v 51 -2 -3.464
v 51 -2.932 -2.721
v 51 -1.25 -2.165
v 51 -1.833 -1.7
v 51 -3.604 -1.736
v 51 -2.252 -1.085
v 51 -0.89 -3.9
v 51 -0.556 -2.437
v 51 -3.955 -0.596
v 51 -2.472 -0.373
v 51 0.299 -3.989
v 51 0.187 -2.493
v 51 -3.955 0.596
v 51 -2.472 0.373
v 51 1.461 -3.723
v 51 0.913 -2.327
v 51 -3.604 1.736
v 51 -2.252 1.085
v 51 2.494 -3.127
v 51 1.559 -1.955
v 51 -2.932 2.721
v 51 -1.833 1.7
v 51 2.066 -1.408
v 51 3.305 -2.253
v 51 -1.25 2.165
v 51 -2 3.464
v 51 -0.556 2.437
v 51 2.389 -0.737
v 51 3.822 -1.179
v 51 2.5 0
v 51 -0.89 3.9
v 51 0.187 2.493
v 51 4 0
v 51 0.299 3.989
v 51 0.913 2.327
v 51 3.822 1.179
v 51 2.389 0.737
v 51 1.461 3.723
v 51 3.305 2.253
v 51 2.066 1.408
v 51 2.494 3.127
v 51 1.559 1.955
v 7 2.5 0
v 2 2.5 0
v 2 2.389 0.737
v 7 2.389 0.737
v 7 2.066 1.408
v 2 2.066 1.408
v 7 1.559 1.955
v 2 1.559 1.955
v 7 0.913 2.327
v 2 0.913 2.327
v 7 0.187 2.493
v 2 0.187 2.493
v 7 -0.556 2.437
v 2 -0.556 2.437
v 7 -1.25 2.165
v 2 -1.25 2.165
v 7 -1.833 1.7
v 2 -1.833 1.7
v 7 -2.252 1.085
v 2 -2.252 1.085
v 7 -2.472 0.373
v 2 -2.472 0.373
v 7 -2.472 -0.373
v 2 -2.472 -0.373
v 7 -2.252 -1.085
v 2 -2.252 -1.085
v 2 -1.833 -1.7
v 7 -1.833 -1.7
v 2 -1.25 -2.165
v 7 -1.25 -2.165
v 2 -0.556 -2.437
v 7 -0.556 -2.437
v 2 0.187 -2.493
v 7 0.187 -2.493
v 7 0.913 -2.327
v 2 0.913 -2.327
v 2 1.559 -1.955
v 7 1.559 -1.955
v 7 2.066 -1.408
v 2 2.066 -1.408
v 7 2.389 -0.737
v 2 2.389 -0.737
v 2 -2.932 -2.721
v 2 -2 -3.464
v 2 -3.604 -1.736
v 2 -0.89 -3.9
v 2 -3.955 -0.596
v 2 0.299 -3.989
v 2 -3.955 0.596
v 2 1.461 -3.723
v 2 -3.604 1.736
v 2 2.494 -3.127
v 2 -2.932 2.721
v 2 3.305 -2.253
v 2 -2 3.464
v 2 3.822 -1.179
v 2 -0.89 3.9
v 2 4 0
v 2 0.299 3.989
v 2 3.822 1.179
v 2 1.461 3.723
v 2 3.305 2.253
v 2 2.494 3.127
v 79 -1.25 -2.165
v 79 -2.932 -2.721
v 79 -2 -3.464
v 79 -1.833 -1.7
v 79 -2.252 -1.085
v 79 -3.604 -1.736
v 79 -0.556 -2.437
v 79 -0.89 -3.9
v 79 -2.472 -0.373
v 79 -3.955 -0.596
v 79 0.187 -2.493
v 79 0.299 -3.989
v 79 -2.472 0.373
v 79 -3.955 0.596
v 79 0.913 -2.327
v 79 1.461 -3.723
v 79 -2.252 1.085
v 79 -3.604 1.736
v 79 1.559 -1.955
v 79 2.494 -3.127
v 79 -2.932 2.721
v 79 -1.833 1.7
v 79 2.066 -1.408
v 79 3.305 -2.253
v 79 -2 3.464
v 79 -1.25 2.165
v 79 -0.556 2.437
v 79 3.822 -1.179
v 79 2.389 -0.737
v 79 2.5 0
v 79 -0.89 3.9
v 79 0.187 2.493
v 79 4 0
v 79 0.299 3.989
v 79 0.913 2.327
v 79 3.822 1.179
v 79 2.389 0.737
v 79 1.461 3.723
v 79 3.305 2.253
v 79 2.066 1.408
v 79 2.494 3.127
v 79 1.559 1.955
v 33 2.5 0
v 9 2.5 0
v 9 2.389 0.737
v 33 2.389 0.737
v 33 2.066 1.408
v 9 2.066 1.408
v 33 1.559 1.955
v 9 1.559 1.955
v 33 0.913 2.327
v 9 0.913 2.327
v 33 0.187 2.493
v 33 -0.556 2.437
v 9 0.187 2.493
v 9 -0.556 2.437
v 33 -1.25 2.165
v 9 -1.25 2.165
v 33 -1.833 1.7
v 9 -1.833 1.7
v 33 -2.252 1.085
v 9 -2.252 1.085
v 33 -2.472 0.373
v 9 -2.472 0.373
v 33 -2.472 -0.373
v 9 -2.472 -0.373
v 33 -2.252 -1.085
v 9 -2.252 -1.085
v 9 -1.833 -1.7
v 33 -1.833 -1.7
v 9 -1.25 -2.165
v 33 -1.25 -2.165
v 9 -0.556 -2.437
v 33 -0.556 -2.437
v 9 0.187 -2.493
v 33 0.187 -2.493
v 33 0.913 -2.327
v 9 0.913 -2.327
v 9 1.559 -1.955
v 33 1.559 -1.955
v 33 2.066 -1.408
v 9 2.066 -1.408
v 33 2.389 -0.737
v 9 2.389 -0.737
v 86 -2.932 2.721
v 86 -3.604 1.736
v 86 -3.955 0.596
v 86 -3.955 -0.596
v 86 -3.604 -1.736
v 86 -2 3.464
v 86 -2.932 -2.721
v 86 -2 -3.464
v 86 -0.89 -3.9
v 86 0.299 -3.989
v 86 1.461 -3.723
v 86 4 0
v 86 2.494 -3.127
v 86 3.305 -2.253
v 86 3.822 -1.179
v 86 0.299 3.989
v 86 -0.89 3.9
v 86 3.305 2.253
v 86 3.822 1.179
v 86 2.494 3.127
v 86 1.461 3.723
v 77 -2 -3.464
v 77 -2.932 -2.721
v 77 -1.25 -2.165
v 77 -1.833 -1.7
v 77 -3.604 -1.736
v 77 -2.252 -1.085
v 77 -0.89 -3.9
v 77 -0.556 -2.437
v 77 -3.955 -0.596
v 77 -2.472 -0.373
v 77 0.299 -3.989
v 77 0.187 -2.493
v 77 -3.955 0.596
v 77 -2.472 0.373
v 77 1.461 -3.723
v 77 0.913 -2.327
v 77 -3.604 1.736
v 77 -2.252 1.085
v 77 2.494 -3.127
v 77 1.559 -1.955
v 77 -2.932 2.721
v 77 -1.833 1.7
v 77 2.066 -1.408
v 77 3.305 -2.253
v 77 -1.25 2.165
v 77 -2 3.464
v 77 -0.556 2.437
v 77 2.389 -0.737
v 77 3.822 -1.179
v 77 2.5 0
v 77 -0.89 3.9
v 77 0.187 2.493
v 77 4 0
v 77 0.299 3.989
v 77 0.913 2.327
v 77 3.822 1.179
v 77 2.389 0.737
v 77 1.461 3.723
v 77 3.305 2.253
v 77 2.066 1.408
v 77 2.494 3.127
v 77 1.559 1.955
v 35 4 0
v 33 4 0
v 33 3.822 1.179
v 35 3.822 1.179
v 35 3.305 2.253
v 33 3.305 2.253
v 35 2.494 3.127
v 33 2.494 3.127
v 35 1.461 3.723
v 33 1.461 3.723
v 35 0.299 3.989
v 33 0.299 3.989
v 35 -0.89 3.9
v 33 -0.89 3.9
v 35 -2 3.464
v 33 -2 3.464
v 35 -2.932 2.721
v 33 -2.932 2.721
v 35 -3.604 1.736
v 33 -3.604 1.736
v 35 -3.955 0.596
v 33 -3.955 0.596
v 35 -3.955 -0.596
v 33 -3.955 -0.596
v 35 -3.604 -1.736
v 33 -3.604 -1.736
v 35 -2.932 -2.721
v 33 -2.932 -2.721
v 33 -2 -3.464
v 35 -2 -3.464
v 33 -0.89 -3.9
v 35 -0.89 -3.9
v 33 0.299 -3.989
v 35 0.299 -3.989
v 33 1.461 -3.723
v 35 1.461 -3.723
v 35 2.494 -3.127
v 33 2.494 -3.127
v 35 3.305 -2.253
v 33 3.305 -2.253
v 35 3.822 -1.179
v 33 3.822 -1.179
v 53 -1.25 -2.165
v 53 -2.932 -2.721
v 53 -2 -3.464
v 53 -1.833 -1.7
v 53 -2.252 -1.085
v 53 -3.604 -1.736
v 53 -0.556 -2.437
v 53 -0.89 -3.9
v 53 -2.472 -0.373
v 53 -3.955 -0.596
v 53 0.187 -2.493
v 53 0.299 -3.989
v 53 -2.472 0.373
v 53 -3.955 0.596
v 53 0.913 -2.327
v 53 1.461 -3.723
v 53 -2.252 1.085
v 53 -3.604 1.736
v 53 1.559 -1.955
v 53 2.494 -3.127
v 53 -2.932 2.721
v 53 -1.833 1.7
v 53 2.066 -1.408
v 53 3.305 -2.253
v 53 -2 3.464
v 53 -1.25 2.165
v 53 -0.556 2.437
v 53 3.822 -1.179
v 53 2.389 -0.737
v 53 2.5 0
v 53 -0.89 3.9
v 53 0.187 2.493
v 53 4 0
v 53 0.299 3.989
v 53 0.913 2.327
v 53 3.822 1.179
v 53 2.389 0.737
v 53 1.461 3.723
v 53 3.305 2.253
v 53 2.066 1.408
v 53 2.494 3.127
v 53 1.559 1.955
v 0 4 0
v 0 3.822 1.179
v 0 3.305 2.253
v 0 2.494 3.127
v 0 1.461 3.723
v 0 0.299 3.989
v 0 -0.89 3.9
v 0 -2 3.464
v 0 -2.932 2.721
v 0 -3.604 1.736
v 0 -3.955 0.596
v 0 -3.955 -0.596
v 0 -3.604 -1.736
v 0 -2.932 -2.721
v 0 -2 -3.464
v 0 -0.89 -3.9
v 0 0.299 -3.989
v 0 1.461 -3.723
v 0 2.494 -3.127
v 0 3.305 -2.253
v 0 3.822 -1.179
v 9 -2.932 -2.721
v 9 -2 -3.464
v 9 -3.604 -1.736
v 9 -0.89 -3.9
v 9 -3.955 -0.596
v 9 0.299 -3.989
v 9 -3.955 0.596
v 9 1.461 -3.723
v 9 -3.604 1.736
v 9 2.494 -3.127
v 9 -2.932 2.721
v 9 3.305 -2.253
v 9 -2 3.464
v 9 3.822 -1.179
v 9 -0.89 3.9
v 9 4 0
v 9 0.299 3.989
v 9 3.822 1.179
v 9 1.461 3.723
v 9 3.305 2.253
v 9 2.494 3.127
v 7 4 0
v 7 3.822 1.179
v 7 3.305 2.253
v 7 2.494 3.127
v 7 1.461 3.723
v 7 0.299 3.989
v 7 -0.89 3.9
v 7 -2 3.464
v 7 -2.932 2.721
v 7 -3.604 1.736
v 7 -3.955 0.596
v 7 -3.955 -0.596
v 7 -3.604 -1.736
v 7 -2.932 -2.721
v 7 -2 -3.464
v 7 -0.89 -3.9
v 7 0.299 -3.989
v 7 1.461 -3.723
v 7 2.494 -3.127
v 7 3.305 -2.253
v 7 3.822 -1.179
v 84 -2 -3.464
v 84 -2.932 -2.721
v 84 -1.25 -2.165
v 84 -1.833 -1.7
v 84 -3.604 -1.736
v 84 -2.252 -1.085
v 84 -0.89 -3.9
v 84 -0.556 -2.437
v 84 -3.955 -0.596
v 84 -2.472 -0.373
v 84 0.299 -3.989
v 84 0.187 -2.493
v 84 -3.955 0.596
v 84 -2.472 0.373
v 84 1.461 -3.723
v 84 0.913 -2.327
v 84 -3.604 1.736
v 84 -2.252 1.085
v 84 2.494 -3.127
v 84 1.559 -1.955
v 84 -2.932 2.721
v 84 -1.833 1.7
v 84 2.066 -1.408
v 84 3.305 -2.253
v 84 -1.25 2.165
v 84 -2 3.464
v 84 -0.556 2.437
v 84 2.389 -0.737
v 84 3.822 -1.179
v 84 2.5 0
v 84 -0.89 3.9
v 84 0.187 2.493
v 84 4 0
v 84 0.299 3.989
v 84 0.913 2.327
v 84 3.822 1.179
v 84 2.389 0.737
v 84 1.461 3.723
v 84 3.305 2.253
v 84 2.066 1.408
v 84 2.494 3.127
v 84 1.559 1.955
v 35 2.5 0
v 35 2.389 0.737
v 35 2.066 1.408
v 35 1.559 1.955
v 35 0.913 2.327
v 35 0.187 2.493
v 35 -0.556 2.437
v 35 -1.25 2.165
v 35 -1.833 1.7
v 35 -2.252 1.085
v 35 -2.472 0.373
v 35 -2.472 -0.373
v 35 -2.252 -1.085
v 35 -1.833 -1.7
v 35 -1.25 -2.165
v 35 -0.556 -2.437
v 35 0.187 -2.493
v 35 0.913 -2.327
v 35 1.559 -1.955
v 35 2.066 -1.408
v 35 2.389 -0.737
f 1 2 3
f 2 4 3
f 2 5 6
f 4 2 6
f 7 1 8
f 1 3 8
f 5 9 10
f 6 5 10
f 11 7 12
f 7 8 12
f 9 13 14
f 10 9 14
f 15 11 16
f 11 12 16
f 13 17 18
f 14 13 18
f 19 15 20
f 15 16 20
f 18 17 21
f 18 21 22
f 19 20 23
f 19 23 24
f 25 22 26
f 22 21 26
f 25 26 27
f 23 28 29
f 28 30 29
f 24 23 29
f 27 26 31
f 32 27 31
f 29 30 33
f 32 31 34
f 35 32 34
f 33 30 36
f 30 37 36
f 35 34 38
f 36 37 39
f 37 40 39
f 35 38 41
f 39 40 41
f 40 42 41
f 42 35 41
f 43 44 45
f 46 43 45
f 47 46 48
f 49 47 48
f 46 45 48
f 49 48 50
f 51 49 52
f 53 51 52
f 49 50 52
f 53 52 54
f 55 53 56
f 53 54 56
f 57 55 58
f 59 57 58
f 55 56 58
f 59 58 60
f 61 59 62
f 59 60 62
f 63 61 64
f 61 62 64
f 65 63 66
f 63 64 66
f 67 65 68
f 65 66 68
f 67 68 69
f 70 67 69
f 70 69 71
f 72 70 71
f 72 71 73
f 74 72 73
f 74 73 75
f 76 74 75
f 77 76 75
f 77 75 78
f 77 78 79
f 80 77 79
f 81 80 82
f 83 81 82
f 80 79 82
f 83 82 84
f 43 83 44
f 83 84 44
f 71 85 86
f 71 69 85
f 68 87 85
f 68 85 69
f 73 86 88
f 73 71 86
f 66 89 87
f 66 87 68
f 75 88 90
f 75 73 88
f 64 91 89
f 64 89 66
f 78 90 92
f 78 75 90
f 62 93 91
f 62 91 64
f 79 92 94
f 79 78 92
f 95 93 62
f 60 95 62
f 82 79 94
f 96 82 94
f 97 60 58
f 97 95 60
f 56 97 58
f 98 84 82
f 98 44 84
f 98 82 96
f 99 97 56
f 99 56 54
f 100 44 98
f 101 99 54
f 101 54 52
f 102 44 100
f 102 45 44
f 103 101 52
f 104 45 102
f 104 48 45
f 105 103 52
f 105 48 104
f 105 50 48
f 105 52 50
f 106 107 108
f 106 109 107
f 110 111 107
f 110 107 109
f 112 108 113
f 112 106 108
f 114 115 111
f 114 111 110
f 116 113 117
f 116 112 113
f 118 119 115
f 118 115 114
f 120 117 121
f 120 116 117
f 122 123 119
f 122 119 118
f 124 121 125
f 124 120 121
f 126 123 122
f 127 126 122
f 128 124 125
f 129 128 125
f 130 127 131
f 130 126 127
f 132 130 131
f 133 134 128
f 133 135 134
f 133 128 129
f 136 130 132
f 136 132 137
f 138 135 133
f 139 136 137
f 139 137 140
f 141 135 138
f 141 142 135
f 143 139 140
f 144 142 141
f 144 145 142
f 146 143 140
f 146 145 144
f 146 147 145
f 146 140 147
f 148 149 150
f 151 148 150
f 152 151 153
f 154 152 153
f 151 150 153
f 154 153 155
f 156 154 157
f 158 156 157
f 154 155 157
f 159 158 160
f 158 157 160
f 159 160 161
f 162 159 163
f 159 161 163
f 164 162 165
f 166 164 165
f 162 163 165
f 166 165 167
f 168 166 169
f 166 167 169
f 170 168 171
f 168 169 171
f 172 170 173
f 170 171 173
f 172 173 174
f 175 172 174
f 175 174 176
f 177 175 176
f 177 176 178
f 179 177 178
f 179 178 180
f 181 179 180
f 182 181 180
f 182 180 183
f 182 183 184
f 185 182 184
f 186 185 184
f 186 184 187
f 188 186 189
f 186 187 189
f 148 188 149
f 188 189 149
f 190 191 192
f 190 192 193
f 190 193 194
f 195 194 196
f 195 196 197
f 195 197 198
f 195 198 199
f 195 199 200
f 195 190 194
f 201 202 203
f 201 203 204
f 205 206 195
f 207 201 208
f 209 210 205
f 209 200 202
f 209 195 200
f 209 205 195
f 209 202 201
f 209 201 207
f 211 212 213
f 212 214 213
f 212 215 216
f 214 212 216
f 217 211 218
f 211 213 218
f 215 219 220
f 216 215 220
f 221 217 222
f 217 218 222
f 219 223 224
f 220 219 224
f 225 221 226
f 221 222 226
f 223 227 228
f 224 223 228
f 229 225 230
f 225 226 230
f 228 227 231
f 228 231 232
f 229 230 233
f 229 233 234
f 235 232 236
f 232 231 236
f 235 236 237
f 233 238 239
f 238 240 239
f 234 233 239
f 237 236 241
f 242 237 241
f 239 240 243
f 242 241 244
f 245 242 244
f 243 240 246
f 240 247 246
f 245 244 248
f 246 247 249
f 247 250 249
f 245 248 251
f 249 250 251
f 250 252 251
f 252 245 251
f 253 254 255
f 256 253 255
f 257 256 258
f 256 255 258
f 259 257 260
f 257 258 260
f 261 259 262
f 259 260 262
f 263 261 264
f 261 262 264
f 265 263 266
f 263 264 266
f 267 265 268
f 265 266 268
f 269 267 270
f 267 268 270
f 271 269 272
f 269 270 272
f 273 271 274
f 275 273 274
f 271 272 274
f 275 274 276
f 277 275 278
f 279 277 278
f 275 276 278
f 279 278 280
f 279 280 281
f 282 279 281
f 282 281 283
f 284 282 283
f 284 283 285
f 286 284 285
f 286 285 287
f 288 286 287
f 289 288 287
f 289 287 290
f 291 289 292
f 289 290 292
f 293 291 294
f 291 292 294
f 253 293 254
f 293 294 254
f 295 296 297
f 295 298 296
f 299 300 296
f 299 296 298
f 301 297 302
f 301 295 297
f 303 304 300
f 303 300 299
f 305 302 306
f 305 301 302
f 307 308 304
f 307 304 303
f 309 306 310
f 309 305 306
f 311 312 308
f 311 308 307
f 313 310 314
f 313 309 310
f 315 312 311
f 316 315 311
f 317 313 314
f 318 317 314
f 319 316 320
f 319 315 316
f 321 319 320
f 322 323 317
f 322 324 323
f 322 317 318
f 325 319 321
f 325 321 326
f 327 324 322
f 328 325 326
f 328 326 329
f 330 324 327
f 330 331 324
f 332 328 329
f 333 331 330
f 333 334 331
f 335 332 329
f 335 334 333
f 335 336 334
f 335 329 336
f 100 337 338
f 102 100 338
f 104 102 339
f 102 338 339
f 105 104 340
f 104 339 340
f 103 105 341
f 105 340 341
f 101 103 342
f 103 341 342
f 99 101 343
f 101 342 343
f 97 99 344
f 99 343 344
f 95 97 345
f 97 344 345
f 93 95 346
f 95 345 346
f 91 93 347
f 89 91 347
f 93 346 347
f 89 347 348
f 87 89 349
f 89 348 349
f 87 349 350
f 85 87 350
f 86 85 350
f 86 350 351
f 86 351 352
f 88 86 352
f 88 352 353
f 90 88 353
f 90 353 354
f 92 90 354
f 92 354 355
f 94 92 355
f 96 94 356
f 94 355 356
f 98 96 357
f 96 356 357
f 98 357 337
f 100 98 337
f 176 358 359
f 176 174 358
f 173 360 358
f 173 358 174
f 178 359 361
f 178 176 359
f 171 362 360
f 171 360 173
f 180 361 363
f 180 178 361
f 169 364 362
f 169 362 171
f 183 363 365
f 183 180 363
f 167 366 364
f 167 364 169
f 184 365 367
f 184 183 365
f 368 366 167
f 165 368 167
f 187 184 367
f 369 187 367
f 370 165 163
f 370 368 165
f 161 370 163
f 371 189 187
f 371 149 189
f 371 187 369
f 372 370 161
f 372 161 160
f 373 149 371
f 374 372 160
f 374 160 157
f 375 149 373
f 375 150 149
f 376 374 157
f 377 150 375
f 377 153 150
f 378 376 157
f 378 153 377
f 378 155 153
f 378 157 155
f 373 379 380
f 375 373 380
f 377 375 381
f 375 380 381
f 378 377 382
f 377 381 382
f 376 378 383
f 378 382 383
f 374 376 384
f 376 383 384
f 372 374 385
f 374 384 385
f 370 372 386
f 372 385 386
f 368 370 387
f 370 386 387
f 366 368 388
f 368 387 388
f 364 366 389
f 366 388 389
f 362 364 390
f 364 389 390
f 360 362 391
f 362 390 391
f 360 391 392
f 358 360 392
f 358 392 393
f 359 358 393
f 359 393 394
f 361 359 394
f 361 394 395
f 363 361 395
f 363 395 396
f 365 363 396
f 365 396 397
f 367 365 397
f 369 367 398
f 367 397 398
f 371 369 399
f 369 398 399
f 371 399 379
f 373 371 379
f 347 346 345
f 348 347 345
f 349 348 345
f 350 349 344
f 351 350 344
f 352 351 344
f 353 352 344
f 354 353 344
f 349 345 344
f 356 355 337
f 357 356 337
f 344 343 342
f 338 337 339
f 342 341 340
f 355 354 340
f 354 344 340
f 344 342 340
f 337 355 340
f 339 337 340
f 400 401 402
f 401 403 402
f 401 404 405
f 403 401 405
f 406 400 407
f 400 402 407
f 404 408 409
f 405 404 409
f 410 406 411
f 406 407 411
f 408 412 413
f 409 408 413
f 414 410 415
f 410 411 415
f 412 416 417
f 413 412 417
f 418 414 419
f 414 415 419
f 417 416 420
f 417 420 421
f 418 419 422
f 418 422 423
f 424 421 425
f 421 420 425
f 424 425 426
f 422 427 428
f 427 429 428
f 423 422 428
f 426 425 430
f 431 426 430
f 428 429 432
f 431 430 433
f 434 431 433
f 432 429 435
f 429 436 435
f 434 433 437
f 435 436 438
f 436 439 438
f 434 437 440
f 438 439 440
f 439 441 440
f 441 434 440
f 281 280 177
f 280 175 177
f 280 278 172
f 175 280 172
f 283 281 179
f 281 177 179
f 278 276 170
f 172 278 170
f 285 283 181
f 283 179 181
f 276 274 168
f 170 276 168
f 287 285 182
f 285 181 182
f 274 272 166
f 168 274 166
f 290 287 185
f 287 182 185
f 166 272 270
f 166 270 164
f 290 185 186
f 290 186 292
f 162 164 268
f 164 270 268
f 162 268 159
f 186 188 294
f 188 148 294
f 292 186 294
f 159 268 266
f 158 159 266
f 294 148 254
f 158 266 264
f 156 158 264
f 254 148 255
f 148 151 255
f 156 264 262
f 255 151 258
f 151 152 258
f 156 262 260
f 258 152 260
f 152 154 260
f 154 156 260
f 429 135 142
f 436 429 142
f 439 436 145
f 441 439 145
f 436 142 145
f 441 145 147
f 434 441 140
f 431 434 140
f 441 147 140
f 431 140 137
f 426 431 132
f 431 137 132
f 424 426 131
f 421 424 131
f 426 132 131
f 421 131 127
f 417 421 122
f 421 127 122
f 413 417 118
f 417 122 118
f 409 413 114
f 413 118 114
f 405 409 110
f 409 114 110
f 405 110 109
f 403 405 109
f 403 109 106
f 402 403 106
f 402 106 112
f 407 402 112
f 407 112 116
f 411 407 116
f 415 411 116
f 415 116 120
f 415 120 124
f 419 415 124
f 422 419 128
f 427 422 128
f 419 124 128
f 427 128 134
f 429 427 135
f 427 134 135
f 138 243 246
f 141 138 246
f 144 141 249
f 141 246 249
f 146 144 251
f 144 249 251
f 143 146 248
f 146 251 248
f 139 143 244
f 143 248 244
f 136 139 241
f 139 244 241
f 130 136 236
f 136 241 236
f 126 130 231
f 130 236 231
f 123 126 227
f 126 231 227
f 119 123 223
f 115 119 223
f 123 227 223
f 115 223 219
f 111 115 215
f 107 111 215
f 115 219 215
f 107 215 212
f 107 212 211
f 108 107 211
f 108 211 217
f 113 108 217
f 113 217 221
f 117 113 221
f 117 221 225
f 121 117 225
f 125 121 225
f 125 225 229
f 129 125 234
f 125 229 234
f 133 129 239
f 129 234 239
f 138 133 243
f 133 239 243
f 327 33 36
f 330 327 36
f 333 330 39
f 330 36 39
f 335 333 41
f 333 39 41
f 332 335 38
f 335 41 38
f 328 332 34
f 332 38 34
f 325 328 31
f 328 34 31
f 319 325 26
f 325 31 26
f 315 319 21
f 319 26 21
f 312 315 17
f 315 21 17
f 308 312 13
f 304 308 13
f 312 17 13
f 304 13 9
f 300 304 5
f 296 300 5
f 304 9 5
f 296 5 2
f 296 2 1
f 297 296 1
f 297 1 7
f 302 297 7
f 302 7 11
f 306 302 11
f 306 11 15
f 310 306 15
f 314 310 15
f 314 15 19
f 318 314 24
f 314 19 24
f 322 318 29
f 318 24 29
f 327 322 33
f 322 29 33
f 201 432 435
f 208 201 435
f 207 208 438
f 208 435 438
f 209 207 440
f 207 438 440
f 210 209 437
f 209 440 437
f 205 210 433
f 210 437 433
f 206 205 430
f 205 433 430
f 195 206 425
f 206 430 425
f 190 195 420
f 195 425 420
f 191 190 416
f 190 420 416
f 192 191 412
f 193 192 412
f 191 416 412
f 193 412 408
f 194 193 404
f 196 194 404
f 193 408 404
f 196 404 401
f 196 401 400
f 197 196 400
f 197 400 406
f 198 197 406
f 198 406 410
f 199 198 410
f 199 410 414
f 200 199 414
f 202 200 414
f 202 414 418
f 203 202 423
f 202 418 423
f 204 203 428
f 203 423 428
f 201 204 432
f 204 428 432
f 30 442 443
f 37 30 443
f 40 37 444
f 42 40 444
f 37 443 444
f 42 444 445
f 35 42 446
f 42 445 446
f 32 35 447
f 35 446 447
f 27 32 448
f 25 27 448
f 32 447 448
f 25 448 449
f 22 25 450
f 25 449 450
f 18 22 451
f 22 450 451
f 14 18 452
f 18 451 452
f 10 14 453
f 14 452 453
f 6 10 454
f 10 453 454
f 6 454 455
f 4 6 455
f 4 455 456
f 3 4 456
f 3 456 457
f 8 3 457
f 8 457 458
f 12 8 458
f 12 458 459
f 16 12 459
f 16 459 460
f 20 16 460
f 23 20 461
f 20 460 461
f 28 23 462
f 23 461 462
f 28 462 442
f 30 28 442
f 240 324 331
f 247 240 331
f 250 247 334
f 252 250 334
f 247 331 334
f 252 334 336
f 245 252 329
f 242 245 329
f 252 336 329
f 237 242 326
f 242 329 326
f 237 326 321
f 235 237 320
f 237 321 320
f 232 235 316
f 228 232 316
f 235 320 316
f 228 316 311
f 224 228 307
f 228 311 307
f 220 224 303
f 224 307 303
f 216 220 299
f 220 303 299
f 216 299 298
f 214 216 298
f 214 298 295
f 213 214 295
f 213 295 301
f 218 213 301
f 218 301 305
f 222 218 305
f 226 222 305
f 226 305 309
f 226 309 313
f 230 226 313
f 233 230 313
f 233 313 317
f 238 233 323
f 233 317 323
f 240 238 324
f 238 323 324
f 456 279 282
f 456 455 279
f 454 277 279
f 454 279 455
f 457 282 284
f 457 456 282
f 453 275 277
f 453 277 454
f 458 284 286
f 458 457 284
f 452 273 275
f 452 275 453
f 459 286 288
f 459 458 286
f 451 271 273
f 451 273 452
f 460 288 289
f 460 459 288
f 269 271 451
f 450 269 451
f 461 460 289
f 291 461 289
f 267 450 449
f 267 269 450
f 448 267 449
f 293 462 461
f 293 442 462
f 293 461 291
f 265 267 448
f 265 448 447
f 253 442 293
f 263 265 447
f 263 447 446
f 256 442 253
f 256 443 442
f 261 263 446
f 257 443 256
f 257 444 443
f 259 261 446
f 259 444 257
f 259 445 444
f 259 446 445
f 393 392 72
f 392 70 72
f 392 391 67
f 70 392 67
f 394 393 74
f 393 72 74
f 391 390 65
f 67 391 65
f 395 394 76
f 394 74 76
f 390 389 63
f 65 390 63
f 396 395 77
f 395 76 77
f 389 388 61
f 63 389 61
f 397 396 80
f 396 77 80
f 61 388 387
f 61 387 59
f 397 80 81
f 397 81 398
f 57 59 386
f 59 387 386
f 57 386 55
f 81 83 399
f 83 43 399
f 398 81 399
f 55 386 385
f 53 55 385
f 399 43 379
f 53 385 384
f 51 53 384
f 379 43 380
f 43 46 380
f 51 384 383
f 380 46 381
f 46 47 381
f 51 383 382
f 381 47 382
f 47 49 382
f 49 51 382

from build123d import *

# Parameters (mm, degrees)
F0_R      = 4
F1_DEPTH  = 2
F2_R      = 2.5
F3_DEPTH  = 5
F4_R      = 4
F5_DEPTH  = 2
F6_R      = 2.5
F7_DEPTH  = 24
F8_R      = 4
F9_DEPTH  = 2
F10_R     = 2.5
F11_DEPTH = 16
F12_R     = 4
F13_DEPTH = 2
F14_R     = 2.5
F15_DEPTH = 24
F16_R     = 4
F17_DEPTH = 2
F18_R     = 2.5
F19_DEPTH = 5
F20_R     = 4
F21_DEPTH = 2


with BuildPart() as f1:
    # F0 (on Right) → F1 (new body)
    with BuildSketch(Plane.YZ):
        Circle(F0_R)
    extrude(amount=F1_DEPTH)

    # F2 (on face) → F3 (join)
    with BuildSketch(Plane.YZ.offset(2)):
        Circle(F2_R)
    extrude(amount=F3_DEPTH)

    # F4 (on face) → F5 (join)
    with BuildSketch(Plane.YZ.offset(7)):
        Circle(F4_R)
    extrude(amount=F5_DEPTH)

    # F6 (on face) → F7 (join)
    with BuildSketch(Plane.YZ.offset(9)):
        Circle(F6_R)
    extrude(amount=F7_DEPTH)

    # F8 (on face) → F9 (join)
    with BuildSketch(Plane.YZ.offset(33)):
        Circle(F8_R)
    extrude(amount=F9_DEPTH)

    # F10 (on face) → F11 (join)
    with BuildSketch(Plane.YZ.offset(35)):
        Circle(F10_R)
    extrude(amount=F11_DEPTH)

    # F12 (on face) → F13 (join)
    with BuildSketch(Plane.YZ.offset(51)):
        Circle(F12_R)
    extrude(amount=F13_DEPTH)

    # F14 (on face) → F15 (join)
    with BuildSketch(Plane.YZ.offset(53)):
        Circle(F14_R)
    extrude(amount=F15_DEPTH)

    # F16 (on face) → F17 (join)
    with BuildSketch(Plane.YZ.offset(77)):
        Circle(F16_R)
    extrude(amount=F17_DEPTH)

    # F18 (on face) → F19 (join)
    with BuildSketch(Plane.YZ.offset(79)):
        Circle(F18_R)
    extrude(amount=F19_DEPTH)

    # F20 (on face) → F21 (join)
    with BuildSketch(Plane.YZ.offset(84)):
        Circle(F20_R)
    extrude(amount=F21_DEPTH)


solid = f1.part
